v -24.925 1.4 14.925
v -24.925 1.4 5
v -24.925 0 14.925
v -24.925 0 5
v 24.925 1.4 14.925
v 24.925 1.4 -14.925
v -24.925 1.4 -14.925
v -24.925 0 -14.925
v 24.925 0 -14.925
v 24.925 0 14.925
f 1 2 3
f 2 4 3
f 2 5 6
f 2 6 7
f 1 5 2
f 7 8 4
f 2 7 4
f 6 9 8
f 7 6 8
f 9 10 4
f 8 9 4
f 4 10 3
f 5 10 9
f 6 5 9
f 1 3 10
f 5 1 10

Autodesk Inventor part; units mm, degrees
ref_plane "YZ Plane" through (0, 0, 0) normal (1, 0, 0) x (0, 1, 0)
ref_plane "XZ Plane" through (0, 0, 0) normal (0, 1, 0) x (-1, 0, 0)
sketch "Sketch1" plane through (0, 0, 0) normal (0, 1, 0) x (-1, 0, 0)
  line L0 (24.925, 14.925) -> (-24.925, 14.925)
  line L1 (-24.925, 14.925) -> (-24.925, -14.925)
  line L2 (-24.925, -14.925) -> (24.925, -14.925)
  line L3 (24.925, 14.925) -> (-24.925, -14.925) construction
  line L4 (-24.925, 14.925) -> (24.925, -14.925) construction
  line L5 (24.925, -14.925) -> (24.925, 14.925)
  line L6 (24.925, 5) -> (24.925, 14.925)
  point P0 (0, 0)
  dimension "d0" = 49.85
  dimension "d1" = 29.85
extrude "Extrusion1" add sketch "Sketch1" along normal blind 1.4
sketch "Sketch2" plane through (0, 0, 0) normal (0, -1, 0) x (1, 0, 0)
  point P0 (0, 0)
sketch "Sketch3" plane through (-24.925, 0, -14.925) normal (-1, 0, 0) x (0, 0, 1)
  point P0 (14.925, 0)
ref_plane "Work Plane1" through (0, 0, 0) normal (0, 1, 0) x (-1, 0, 0)
sketch "Sketch5" plane through (0, 0, 0) normal (0, 1, 0) x (-1, 0, 0)
  line L0 (-24.925, 14.925) -> (24.925, 14.925) projected
  line L1 (24.925, -14.925) -> (-24.925, -14.925) projected
  line L2 (24.925, 14.925) -> (24.925, -14.925) projected
  line L3 (-19.3821, 7.7039) -> (19.3821, 7.7039) construction
  line L4 (19.3821, 7.7039) -> (19.3821, -7.7039) construction
  line L5 (19.3821, -7.7039) -> (-19.3821, -7.7039) construction
  line L6 (-19.3821, -7.7039) -> (-19.3821, 7.7039) construction
  line L7 (-24.925, -14.925) -> (-24.925, 14.925) projected
  point P0 (0, 0)
  dimension "d13" = 29.85
  dimension "d14" = 49.85
  dimension "d16" = 38.7641
  dimension "d17" = 15.4078
  dimension "d18" = 7.2211
  dimension "d22" = 5.5429
sketch "Sketch6" plane through (0, 0, 0) normal (0, -1, 0) x (1, 0, 0)
  line L0 (-24.925, 14.925) -> (-24.925, -14.925) projected
  line L1 (24.925, 14.925) -> (-24.925, 14.925) projected
  line L2 (24.925, -14.925) -> (24.925, 14.925) projected
  line L3 (-24.925, -14.925) -> (24.925, -14.925) projected
  line L4 (-22.925, 10.925) -> (-22.925, -10.925)
  line L5 (-20.925, -12.925) -> (20.925, -12.925)
  line L6 (22.925, -10.925) -> (22.925, 10.925)
  line L7 (20.925, 12.925) -> (-20.925, 12.925)
  arc A0 (-20.925, 12.925) -> (-22.925, 10.925) centre (-20.925, 10.925) ccw
  arc A1 (-22.925, -10.925) -> (-20.925, -12.925) centre (-20.925, -10.925) ccw
  arc A2 (20.925, -12.925) -> (22.925, -10.925) centre (20.925, -10.925) ccw
  arc A3 (22.925, 10.925) -> (20.925, 12.925) centre (20.925, 10.925) ccw
  line L8 (-20.925, 12.525) -> (20.925, 12.525)
  arc A4 (22.525, 10.925) -> (20.925, 12.525) centre (20.925, 10.925) ccw
  line L9 (22.525, 10.925) -> (22.525, -10.925)
  arc A5 (20.925, -12.525) -> (22.525, -10.925) centre (20.925, -10.925) ccw
  line L10 (20.925, -12.525) -> (-20.925, -12.525)
  arc A6 (-22.525, -10.925) -> (-20.925, -12.525) centre (-20.925, -10.925) ccw
  line L11 (-22.525, -10.925) -> (-22.525, 10.925)
  arc A7 (-20.925, 12.525) -> (-22.525, 10.925) centre (-20.925, 10.925) ccw
  point P0 (0, 0)
  dimension "d23" = 2
  dimension "d24" = 2
  dimension "d25" = 0.4
equation "\"d18\" = 0.5 * d13 - 0.5 * d17"
equation "\"d22\" = 0.5 * d14 - 0.5 * d16"
properties part number "stamp5x3_empty" material "PET Plastic"
